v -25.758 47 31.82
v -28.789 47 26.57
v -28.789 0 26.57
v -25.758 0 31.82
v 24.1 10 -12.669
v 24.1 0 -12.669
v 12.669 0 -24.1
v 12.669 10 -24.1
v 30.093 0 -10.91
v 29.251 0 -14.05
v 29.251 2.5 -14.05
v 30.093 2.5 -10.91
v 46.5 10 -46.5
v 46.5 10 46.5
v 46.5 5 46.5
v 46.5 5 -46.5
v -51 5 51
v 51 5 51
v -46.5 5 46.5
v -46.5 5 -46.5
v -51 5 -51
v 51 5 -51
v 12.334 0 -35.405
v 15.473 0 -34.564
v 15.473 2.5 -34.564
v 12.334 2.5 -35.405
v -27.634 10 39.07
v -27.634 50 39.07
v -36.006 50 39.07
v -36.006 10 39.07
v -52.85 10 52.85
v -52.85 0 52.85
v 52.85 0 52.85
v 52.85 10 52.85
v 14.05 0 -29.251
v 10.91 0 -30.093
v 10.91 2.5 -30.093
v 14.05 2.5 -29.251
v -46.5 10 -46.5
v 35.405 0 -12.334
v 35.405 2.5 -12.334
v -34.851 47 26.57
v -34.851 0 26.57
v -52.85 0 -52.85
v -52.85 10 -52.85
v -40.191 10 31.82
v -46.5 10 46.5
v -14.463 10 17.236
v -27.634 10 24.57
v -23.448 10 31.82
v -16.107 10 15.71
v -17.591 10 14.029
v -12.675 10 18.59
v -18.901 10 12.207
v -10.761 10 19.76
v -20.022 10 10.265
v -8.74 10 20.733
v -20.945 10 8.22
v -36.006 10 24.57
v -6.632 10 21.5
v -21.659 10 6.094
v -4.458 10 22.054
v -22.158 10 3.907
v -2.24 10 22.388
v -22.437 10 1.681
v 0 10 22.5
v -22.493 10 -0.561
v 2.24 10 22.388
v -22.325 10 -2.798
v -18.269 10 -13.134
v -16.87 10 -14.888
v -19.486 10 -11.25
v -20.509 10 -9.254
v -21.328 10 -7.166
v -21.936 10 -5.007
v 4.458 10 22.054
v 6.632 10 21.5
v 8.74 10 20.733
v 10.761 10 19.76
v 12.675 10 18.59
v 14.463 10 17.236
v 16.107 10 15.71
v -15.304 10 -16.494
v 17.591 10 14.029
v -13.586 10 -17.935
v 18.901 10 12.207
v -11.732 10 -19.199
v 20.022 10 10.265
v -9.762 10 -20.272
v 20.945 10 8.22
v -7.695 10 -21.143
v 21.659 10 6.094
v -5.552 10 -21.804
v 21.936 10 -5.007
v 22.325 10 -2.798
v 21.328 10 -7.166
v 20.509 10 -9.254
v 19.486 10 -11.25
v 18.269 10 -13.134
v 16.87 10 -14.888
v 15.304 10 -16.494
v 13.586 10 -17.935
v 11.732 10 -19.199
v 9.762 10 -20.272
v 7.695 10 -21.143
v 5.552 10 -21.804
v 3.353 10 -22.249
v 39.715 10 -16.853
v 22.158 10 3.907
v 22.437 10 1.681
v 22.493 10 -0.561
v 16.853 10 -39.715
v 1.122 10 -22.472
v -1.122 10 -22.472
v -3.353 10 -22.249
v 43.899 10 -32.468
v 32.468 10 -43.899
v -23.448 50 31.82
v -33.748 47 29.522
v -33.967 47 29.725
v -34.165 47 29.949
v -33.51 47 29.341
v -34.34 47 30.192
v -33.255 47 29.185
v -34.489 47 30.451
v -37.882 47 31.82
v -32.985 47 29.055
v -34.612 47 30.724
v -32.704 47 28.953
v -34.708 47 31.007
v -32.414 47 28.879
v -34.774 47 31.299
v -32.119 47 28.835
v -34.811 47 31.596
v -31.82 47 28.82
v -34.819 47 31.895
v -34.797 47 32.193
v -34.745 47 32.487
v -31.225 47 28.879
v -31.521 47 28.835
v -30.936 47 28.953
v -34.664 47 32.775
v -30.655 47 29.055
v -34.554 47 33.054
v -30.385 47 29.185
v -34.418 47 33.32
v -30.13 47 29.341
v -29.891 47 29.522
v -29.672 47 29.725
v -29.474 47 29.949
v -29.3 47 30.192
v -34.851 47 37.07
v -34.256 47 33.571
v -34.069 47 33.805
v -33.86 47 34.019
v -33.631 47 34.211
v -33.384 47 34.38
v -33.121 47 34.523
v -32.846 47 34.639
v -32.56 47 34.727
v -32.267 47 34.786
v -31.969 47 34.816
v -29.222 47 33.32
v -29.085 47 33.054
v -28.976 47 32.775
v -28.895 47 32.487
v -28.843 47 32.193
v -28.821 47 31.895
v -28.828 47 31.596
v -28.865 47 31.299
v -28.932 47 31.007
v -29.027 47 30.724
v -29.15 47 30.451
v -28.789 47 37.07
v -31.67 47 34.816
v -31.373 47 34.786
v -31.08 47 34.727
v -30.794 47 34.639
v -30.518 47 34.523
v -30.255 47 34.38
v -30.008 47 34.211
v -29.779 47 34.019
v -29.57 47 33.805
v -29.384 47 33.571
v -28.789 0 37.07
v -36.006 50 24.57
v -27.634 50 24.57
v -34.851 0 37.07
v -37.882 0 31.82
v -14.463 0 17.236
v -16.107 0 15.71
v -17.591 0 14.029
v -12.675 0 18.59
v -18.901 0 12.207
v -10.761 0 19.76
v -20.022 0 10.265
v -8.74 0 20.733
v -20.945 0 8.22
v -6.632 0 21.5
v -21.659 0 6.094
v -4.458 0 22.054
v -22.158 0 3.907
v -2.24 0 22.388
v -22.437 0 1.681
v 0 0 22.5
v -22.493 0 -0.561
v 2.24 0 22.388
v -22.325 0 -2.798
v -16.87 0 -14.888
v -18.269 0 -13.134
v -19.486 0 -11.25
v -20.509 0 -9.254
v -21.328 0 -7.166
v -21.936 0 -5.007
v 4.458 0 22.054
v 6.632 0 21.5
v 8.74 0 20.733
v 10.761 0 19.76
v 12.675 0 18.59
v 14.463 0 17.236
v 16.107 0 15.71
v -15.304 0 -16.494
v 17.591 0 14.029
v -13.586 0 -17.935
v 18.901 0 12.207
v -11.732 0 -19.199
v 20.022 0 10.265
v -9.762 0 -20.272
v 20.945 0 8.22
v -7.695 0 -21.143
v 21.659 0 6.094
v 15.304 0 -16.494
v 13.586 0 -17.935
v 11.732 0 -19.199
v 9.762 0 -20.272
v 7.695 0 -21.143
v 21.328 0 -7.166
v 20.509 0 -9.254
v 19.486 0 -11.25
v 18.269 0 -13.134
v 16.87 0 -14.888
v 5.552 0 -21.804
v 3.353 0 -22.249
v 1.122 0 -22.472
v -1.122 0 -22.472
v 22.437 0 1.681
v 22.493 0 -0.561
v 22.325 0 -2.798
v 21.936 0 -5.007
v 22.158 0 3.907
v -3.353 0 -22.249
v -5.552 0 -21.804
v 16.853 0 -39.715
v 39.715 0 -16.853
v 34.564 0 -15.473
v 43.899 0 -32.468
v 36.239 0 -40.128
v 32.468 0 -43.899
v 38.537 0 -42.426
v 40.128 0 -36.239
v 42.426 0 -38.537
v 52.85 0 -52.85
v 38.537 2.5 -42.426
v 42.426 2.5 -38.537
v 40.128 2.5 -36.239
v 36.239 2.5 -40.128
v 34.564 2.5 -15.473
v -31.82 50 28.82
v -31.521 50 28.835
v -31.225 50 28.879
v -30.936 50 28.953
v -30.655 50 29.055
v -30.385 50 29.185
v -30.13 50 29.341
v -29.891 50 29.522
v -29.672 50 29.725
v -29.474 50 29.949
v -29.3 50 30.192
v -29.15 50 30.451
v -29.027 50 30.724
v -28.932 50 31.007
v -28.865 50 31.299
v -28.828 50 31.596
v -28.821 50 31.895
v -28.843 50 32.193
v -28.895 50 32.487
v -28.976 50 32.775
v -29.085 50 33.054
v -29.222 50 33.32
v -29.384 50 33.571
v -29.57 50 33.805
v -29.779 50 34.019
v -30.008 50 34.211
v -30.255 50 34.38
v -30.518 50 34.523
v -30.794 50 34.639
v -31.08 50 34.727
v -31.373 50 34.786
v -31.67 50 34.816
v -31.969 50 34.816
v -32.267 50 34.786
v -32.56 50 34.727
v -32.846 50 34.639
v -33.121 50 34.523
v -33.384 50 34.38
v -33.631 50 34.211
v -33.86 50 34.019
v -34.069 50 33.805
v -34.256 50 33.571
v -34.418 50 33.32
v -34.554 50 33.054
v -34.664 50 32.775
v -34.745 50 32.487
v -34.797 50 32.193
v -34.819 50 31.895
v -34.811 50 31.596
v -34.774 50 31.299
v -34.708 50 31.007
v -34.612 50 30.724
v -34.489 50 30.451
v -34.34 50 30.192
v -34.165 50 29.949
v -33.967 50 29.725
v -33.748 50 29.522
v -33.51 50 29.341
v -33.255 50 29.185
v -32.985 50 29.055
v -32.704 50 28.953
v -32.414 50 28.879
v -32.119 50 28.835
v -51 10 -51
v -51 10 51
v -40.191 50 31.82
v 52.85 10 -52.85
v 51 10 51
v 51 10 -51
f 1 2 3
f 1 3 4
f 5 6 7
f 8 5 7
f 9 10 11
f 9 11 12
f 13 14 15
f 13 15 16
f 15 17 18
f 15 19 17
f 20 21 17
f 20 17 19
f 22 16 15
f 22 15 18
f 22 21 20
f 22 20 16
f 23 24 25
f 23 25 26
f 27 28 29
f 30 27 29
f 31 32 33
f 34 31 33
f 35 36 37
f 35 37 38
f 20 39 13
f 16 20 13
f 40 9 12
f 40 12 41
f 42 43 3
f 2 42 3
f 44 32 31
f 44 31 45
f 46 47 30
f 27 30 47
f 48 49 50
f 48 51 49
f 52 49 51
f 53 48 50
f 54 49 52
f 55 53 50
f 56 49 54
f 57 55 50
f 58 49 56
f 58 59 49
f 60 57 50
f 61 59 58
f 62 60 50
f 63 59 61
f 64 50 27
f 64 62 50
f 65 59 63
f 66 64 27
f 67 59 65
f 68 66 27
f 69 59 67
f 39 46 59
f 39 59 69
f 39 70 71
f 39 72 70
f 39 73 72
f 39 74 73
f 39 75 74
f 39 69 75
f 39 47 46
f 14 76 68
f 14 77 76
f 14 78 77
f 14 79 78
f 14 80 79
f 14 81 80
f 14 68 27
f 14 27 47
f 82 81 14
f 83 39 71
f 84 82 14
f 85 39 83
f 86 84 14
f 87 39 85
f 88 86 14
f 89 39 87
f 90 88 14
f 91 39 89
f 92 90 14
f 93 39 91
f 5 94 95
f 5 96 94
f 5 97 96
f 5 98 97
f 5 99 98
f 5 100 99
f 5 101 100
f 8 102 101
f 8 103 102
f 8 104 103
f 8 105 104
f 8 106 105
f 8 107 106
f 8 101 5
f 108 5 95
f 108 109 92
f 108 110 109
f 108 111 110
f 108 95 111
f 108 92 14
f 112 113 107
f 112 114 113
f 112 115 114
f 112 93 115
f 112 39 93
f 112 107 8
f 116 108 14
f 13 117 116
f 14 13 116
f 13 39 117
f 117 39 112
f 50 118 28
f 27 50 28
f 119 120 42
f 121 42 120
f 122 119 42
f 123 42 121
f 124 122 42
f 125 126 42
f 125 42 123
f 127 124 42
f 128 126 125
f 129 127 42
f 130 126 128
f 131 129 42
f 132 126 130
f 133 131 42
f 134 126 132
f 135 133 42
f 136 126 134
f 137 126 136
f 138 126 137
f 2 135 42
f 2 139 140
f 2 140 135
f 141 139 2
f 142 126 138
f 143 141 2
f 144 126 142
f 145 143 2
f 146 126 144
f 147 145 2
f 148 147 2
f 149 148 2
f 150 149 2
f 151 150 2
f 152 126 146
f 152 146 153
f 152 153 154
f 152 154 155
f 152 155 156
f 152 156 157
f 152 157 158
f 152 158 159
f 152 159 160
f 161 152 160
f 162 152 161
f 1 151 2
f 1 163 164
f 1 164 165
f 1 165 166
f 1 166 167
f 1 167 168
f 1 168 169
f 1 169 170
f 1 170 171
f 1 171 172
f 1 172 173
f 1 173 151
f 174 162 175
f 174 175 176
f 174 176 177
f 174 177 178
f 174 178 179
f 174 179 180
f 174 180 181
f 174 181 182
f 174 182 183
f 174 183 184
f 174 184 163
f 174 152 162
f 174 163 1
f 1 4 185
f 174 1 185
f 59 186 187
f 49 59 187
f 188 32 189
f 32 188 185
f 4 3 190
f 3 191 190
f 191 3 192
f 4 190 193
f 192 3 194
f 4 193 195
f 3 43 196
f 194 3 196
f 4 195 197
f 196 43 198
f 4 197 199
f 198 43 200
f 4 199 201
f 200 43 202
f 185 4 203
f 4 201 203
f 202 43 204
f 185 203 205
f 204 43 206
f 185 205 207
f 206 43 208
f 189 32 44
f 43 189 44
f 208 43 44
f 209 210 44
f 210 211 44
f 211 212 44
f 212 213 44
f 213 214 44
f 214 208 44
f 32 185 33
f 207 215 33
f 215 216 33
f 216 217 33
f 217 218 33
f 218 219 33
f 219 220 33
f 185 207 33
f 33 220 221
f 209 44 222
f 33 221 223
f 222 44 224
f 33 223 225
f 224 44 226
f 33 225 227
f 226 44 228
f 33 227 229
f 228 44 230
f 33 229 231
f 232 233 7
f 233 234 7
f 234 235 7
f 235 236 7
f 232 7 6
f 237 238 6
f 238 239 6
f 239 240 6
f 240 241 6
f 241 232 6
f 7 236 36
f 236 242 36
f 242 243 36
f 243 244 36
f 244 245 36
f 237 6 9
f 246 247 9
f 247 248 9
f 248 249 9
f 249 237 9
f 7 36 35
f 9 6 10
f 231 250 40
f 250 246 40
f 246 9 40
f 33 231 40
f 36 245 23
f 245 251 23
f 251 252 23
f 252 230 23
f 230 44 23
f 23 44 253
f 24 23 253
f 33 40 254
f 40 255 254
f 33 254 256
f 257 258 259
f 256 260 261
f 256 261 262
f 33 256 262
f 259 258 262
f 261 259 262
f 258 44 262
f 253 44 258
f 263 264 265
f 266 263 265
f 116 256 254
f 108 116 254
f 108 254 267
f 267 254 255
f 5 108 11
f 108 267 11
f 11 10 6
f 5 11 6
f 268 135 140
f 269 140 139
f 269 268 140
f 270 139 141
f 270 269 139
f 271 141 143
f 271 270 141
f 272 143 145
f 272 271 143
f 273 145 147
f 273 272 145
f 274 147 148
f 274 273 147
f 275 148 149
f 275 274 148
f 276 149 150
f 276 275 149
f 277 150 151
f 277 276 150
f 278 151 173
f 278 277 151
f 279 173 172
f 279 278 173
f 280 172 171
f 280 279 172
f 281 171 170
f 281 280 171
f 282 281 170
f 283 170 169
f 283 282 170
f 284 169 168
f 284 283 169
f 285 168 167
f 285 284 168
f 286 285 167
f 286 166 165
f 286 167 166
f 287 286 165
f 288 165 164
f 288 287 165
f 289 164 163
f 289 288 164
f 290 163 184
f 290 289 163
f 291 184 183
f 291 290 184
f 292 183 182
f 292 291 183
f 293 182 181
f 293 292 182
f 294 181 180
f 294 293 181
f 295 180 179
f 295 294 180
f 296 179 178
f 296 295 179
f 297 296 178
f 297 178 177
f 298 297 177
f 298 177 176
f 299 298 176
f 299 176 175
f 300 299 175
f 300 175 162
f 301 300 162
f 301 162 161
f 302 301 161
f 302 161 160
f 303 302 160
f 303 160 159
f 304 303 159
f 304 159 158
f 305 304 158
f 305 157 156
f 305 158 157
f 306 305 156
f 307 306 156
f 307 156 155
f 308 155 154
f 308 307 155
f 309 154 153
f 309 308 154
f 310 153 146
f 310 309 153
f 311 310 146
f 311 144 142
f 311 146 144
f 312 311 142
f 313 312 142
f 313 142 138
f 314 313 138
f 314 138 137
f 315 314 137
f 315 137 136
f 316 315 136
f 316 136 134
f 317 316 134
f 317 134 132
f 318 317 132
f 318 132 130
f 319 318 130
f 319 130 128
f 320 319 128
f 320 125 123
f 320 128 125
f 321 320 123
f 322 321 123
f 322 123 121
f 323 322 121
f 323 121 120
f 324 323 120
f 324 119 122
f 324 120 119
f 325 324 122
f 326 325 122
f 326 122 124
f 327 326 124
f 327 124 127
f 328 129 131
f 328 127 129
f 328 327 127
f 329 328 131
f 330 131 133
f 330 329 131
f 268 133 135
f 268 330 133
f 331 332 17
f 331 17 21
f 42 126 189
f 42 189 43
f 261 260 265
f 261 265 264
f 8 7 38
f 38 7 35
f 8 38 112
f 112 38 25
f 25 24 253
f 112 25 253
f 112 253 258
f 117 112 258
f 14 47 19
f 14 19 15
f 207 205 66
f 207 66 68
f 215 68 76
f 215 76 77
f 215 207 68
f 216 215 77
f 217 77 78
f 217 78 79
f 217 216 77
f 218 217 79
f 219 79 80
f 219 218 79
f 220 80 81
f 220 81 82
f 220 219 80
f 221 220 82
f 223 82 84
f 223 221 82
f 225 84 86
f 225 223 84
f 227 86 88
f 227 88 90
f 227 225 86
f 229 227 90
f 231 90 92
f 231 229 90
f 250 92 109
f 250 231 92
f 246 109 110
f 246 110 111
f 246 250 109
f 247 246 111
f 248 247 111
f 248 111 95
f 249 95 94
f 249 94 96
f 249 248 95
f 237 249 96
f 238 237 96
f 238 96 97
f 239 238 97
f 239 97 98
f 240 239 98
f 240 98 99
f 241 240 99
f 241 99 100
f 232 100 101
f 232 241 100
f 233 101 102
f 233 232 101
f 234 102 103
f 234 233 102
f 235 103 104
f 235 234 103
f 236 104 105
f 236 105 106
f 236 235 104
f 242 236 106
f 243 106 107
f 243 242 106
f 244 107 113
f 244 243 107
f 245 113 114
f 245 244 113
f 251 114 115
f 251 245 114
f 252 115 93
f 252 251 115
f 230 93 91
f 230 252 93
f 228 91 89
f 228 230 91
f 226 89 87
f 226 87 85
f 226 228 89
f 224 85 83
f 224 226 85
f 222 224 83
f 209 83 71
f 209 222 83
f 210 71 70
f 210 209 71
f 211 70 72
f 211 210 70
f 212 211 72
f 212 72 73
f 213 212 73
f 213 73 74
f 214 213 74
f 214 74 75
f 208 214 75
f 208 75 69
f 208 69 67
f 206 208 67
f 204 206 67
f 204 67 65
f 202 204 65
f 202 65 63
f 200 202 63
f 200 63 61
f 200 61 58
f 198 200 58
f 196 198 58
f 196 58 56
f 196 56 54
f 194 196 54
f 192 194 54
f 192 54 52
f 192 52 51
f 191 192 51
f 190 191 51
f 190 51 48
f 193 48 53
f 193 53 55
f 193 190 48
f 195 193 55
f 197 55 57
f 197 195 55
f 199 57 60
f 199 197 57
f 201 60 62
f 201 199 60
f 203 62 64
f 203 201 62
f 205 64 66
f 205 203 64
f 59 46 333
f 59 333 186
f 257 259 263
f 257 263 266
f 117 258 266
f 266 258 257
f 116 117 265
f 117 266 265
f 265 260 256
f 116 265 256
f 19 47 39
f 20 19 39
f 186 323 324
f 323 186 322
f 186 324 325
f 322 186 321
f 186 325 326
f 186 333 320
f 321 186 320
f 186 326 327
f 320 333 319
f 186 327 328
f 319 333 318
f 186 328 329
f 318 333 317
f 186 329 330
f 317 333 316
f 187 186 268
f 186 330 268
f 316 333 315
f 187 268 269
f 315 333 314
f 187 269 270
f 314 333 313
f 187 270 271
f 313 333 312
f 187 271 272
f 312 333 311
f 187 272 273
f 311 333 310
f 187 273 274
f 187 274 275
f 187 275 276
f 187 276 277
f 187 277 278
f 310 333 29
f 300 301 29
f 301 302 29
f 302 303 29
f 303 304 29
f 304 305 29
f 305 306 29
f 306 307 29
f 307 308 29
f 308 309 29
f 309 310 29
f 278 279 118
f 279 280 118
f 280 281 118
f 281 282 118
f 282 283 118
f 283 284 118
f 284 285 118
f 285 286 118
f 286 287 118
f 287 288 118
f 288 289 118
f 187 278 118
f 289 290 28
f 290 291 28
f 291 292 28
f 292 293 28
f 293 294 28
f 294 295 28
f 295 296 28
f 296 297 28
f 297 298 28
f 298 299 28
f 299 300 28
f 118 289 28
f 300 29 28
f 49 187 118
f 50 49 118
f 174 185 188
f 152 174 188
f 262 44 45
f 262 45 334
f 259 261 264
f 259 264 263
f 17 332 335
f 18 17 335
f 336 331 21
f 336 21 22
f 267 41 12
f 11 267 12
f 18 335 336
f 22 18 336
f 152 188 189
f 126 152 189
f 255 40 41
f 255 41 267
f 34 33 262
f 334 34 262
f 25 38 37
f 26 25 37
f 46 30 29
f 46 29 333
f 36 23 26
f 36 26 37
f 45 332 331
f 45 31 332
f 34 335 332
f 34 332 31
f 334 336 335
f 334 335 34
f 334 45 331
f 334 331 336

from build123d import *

# Parameters (mm, degrees)
SKETCH1_W           = 105.7
SKETCH1_H           = 105.7
SKETCH1_R           = 22.5
BOSS_EXTRUDE1_DEPTH = 10
SKETCH3_W           = 102
SKETCH3_H           = 102
SKETCH3_W_2         = 93
SKETCH3_H_2         = 93
CUT_EXTRUDE1_DEPTH  = 5
SKETCH8_R           = 3
CUT_EXTRUDE5_DEPTH  = 76.407194617
SKETCH4_R           = 10.375
CUT_EXTRUDE7_DEPTH  = 76.407194617
CUT_EXTRUDE11_DEPTH = 76.407194617
BOSS_EXTRUDE5_START = -40
SKETCH9_R           = 3
BOSS_EXTRUDE5_DEPTH = 40
CUT_EXTRUDE12_DEPTH = 47
CUT_EXTRUDE13_DEPTH = 2.5


with BuildPart() as part:
    # Sketch1 → Boss-Extrude1 (new body)
    with BuildSketch(Plane(origin=(0, 0, 0), x_dir=(1, 0, 0), z_dir=(0, 1, 0))):
        Rectangle(SKETCH1_W, SKETCH1_H)
        with Locations(Location((0, 0, 0), (0, 0, 270))):
            Circle(SKETCH1_R, mode=Mode.SUBTRACT)
    extrude(amount=BOSS_EXTRUDE1_DEPTH)

    # Sketch3 → Cut-Extrude1 (cut)
    with BuildSketch(Plane(origin=(0, 10, 0), x_dir=(1, 0, 0), z_dir=(0, 1, 0))):
        Rectangle(SKETCH3_W, SKETCH3_H)
        Rectangle(SKETCH3_W_2, SKETCH3_H_2, mode=Mode.SUBTRACT)
    extrude(amount=-CUT_EXTRUDE1_DEPTH, mode=Mode.SUBTRACT)

    # Sketch8 → Cut-Extrude5 (cut, through all)
    with BuildSketch(Plane.XZ.offset(-10)):
        with Locations(Location((-31.819805153, 31.819805153, 0), (0, 0, 270))):
            Circle(SKETCH8_R)
    extrude(amount=CUT_EXTRUDE5_DEPTH, mode=Mode.SUBTRACT)

    # Sketch4 → Cut-Extrude7 (cut, through all)
    with BuildSketch(Plane(origin=(0, 10, 0), x_dir=(1, 0, 0), z_dir=(0, 1, 0))):
        with Locations(Location((28.284271247, 28.284271247, 0), (0, 0, 270))):
            Circle(SKETCH4_R)
    extrude(amount=-CUT_EXTRUDE7_DEPTH, mode=Mode.SUBTRACT)

    # Sketch12 → Cut-Extrude11 (cut, through all)
    with BuildSketch(Plane.XZ):
        Polygon((43.899242251, -32.468290118), (39.71522338, -16.853319114), (24.100252377, -12.669300244), (12.669300244, -24.100252377), (16.853319114, -39.71522338), (32.468290118, -43.899242251), align=None)
    extrude(amount=-CUT_EXTRUDE11_DEPTH, mode=Mode.SUBTRACT)

    # Sketch9 → Boss-Extrude5 (add)
    with BuildSketch(Plane.XZ.offset(-10).offset(BOSS_EXTRUDE5_START)):
        Polygon((-23.44822625, 31.819805153), (-27.634015702, 39.069805153), (-36.005594605, 39.069805153), (-40.191384057, 31.819805153), (-36.005594605, 24.569805153), (-27.634015702, 24.569805153), align=None)
        with Locations(Location((-31.819805153, 31.819805153, 0), (0, 0, 270))):
            Circle(SKETCH9_R, mode=Mode.SUBTRACT)
    extrude(amount=BOSS_EXTRUDE5_DEPTH)

    # Sketch16 → Cut-Extrude12 (cut)
    with BuildSketch(Plane.XZ):
        Polygon((-25.757627327, 31.819805153), (-28.78871624, 37.069805153), (-34.850894067, 37.069805153), (-37.88198298, 31.819805153), (-34.850894067, 26.569805153), (-28.78871624, 26.569805153), align=None)
    extrude(amount=-CUT_EXTRUDE12_DEPTH, mode=Mode.SUBTRACT)

    # Sketch17 → Cut-Extrude13 (cut)
    with BuildSketch(Plane.XZ):
        Polygon((29.251441857, -14.049557305), (30.092603753, -10.91029837), (35.405195798, -12.333803118), (34.564033901, -15.473062053), align=None)
        Polygon((36.239222536, -40.128309832), (40.128309832, -36.239222536), (42.426406871, -38.537319575), (38.537319575, -42.426406871), align=None)
        Polygon((14.049557305, -29.251441857), (15.473062053, -34.564033901), (12.333803118, -35.405195798), (10.91029837, -30.092603753), align=None)
    extrude(amount=-CUT_EXTRUDE13_DEPTH, mode=Mode.SUBTRACT)


solid = part.part
